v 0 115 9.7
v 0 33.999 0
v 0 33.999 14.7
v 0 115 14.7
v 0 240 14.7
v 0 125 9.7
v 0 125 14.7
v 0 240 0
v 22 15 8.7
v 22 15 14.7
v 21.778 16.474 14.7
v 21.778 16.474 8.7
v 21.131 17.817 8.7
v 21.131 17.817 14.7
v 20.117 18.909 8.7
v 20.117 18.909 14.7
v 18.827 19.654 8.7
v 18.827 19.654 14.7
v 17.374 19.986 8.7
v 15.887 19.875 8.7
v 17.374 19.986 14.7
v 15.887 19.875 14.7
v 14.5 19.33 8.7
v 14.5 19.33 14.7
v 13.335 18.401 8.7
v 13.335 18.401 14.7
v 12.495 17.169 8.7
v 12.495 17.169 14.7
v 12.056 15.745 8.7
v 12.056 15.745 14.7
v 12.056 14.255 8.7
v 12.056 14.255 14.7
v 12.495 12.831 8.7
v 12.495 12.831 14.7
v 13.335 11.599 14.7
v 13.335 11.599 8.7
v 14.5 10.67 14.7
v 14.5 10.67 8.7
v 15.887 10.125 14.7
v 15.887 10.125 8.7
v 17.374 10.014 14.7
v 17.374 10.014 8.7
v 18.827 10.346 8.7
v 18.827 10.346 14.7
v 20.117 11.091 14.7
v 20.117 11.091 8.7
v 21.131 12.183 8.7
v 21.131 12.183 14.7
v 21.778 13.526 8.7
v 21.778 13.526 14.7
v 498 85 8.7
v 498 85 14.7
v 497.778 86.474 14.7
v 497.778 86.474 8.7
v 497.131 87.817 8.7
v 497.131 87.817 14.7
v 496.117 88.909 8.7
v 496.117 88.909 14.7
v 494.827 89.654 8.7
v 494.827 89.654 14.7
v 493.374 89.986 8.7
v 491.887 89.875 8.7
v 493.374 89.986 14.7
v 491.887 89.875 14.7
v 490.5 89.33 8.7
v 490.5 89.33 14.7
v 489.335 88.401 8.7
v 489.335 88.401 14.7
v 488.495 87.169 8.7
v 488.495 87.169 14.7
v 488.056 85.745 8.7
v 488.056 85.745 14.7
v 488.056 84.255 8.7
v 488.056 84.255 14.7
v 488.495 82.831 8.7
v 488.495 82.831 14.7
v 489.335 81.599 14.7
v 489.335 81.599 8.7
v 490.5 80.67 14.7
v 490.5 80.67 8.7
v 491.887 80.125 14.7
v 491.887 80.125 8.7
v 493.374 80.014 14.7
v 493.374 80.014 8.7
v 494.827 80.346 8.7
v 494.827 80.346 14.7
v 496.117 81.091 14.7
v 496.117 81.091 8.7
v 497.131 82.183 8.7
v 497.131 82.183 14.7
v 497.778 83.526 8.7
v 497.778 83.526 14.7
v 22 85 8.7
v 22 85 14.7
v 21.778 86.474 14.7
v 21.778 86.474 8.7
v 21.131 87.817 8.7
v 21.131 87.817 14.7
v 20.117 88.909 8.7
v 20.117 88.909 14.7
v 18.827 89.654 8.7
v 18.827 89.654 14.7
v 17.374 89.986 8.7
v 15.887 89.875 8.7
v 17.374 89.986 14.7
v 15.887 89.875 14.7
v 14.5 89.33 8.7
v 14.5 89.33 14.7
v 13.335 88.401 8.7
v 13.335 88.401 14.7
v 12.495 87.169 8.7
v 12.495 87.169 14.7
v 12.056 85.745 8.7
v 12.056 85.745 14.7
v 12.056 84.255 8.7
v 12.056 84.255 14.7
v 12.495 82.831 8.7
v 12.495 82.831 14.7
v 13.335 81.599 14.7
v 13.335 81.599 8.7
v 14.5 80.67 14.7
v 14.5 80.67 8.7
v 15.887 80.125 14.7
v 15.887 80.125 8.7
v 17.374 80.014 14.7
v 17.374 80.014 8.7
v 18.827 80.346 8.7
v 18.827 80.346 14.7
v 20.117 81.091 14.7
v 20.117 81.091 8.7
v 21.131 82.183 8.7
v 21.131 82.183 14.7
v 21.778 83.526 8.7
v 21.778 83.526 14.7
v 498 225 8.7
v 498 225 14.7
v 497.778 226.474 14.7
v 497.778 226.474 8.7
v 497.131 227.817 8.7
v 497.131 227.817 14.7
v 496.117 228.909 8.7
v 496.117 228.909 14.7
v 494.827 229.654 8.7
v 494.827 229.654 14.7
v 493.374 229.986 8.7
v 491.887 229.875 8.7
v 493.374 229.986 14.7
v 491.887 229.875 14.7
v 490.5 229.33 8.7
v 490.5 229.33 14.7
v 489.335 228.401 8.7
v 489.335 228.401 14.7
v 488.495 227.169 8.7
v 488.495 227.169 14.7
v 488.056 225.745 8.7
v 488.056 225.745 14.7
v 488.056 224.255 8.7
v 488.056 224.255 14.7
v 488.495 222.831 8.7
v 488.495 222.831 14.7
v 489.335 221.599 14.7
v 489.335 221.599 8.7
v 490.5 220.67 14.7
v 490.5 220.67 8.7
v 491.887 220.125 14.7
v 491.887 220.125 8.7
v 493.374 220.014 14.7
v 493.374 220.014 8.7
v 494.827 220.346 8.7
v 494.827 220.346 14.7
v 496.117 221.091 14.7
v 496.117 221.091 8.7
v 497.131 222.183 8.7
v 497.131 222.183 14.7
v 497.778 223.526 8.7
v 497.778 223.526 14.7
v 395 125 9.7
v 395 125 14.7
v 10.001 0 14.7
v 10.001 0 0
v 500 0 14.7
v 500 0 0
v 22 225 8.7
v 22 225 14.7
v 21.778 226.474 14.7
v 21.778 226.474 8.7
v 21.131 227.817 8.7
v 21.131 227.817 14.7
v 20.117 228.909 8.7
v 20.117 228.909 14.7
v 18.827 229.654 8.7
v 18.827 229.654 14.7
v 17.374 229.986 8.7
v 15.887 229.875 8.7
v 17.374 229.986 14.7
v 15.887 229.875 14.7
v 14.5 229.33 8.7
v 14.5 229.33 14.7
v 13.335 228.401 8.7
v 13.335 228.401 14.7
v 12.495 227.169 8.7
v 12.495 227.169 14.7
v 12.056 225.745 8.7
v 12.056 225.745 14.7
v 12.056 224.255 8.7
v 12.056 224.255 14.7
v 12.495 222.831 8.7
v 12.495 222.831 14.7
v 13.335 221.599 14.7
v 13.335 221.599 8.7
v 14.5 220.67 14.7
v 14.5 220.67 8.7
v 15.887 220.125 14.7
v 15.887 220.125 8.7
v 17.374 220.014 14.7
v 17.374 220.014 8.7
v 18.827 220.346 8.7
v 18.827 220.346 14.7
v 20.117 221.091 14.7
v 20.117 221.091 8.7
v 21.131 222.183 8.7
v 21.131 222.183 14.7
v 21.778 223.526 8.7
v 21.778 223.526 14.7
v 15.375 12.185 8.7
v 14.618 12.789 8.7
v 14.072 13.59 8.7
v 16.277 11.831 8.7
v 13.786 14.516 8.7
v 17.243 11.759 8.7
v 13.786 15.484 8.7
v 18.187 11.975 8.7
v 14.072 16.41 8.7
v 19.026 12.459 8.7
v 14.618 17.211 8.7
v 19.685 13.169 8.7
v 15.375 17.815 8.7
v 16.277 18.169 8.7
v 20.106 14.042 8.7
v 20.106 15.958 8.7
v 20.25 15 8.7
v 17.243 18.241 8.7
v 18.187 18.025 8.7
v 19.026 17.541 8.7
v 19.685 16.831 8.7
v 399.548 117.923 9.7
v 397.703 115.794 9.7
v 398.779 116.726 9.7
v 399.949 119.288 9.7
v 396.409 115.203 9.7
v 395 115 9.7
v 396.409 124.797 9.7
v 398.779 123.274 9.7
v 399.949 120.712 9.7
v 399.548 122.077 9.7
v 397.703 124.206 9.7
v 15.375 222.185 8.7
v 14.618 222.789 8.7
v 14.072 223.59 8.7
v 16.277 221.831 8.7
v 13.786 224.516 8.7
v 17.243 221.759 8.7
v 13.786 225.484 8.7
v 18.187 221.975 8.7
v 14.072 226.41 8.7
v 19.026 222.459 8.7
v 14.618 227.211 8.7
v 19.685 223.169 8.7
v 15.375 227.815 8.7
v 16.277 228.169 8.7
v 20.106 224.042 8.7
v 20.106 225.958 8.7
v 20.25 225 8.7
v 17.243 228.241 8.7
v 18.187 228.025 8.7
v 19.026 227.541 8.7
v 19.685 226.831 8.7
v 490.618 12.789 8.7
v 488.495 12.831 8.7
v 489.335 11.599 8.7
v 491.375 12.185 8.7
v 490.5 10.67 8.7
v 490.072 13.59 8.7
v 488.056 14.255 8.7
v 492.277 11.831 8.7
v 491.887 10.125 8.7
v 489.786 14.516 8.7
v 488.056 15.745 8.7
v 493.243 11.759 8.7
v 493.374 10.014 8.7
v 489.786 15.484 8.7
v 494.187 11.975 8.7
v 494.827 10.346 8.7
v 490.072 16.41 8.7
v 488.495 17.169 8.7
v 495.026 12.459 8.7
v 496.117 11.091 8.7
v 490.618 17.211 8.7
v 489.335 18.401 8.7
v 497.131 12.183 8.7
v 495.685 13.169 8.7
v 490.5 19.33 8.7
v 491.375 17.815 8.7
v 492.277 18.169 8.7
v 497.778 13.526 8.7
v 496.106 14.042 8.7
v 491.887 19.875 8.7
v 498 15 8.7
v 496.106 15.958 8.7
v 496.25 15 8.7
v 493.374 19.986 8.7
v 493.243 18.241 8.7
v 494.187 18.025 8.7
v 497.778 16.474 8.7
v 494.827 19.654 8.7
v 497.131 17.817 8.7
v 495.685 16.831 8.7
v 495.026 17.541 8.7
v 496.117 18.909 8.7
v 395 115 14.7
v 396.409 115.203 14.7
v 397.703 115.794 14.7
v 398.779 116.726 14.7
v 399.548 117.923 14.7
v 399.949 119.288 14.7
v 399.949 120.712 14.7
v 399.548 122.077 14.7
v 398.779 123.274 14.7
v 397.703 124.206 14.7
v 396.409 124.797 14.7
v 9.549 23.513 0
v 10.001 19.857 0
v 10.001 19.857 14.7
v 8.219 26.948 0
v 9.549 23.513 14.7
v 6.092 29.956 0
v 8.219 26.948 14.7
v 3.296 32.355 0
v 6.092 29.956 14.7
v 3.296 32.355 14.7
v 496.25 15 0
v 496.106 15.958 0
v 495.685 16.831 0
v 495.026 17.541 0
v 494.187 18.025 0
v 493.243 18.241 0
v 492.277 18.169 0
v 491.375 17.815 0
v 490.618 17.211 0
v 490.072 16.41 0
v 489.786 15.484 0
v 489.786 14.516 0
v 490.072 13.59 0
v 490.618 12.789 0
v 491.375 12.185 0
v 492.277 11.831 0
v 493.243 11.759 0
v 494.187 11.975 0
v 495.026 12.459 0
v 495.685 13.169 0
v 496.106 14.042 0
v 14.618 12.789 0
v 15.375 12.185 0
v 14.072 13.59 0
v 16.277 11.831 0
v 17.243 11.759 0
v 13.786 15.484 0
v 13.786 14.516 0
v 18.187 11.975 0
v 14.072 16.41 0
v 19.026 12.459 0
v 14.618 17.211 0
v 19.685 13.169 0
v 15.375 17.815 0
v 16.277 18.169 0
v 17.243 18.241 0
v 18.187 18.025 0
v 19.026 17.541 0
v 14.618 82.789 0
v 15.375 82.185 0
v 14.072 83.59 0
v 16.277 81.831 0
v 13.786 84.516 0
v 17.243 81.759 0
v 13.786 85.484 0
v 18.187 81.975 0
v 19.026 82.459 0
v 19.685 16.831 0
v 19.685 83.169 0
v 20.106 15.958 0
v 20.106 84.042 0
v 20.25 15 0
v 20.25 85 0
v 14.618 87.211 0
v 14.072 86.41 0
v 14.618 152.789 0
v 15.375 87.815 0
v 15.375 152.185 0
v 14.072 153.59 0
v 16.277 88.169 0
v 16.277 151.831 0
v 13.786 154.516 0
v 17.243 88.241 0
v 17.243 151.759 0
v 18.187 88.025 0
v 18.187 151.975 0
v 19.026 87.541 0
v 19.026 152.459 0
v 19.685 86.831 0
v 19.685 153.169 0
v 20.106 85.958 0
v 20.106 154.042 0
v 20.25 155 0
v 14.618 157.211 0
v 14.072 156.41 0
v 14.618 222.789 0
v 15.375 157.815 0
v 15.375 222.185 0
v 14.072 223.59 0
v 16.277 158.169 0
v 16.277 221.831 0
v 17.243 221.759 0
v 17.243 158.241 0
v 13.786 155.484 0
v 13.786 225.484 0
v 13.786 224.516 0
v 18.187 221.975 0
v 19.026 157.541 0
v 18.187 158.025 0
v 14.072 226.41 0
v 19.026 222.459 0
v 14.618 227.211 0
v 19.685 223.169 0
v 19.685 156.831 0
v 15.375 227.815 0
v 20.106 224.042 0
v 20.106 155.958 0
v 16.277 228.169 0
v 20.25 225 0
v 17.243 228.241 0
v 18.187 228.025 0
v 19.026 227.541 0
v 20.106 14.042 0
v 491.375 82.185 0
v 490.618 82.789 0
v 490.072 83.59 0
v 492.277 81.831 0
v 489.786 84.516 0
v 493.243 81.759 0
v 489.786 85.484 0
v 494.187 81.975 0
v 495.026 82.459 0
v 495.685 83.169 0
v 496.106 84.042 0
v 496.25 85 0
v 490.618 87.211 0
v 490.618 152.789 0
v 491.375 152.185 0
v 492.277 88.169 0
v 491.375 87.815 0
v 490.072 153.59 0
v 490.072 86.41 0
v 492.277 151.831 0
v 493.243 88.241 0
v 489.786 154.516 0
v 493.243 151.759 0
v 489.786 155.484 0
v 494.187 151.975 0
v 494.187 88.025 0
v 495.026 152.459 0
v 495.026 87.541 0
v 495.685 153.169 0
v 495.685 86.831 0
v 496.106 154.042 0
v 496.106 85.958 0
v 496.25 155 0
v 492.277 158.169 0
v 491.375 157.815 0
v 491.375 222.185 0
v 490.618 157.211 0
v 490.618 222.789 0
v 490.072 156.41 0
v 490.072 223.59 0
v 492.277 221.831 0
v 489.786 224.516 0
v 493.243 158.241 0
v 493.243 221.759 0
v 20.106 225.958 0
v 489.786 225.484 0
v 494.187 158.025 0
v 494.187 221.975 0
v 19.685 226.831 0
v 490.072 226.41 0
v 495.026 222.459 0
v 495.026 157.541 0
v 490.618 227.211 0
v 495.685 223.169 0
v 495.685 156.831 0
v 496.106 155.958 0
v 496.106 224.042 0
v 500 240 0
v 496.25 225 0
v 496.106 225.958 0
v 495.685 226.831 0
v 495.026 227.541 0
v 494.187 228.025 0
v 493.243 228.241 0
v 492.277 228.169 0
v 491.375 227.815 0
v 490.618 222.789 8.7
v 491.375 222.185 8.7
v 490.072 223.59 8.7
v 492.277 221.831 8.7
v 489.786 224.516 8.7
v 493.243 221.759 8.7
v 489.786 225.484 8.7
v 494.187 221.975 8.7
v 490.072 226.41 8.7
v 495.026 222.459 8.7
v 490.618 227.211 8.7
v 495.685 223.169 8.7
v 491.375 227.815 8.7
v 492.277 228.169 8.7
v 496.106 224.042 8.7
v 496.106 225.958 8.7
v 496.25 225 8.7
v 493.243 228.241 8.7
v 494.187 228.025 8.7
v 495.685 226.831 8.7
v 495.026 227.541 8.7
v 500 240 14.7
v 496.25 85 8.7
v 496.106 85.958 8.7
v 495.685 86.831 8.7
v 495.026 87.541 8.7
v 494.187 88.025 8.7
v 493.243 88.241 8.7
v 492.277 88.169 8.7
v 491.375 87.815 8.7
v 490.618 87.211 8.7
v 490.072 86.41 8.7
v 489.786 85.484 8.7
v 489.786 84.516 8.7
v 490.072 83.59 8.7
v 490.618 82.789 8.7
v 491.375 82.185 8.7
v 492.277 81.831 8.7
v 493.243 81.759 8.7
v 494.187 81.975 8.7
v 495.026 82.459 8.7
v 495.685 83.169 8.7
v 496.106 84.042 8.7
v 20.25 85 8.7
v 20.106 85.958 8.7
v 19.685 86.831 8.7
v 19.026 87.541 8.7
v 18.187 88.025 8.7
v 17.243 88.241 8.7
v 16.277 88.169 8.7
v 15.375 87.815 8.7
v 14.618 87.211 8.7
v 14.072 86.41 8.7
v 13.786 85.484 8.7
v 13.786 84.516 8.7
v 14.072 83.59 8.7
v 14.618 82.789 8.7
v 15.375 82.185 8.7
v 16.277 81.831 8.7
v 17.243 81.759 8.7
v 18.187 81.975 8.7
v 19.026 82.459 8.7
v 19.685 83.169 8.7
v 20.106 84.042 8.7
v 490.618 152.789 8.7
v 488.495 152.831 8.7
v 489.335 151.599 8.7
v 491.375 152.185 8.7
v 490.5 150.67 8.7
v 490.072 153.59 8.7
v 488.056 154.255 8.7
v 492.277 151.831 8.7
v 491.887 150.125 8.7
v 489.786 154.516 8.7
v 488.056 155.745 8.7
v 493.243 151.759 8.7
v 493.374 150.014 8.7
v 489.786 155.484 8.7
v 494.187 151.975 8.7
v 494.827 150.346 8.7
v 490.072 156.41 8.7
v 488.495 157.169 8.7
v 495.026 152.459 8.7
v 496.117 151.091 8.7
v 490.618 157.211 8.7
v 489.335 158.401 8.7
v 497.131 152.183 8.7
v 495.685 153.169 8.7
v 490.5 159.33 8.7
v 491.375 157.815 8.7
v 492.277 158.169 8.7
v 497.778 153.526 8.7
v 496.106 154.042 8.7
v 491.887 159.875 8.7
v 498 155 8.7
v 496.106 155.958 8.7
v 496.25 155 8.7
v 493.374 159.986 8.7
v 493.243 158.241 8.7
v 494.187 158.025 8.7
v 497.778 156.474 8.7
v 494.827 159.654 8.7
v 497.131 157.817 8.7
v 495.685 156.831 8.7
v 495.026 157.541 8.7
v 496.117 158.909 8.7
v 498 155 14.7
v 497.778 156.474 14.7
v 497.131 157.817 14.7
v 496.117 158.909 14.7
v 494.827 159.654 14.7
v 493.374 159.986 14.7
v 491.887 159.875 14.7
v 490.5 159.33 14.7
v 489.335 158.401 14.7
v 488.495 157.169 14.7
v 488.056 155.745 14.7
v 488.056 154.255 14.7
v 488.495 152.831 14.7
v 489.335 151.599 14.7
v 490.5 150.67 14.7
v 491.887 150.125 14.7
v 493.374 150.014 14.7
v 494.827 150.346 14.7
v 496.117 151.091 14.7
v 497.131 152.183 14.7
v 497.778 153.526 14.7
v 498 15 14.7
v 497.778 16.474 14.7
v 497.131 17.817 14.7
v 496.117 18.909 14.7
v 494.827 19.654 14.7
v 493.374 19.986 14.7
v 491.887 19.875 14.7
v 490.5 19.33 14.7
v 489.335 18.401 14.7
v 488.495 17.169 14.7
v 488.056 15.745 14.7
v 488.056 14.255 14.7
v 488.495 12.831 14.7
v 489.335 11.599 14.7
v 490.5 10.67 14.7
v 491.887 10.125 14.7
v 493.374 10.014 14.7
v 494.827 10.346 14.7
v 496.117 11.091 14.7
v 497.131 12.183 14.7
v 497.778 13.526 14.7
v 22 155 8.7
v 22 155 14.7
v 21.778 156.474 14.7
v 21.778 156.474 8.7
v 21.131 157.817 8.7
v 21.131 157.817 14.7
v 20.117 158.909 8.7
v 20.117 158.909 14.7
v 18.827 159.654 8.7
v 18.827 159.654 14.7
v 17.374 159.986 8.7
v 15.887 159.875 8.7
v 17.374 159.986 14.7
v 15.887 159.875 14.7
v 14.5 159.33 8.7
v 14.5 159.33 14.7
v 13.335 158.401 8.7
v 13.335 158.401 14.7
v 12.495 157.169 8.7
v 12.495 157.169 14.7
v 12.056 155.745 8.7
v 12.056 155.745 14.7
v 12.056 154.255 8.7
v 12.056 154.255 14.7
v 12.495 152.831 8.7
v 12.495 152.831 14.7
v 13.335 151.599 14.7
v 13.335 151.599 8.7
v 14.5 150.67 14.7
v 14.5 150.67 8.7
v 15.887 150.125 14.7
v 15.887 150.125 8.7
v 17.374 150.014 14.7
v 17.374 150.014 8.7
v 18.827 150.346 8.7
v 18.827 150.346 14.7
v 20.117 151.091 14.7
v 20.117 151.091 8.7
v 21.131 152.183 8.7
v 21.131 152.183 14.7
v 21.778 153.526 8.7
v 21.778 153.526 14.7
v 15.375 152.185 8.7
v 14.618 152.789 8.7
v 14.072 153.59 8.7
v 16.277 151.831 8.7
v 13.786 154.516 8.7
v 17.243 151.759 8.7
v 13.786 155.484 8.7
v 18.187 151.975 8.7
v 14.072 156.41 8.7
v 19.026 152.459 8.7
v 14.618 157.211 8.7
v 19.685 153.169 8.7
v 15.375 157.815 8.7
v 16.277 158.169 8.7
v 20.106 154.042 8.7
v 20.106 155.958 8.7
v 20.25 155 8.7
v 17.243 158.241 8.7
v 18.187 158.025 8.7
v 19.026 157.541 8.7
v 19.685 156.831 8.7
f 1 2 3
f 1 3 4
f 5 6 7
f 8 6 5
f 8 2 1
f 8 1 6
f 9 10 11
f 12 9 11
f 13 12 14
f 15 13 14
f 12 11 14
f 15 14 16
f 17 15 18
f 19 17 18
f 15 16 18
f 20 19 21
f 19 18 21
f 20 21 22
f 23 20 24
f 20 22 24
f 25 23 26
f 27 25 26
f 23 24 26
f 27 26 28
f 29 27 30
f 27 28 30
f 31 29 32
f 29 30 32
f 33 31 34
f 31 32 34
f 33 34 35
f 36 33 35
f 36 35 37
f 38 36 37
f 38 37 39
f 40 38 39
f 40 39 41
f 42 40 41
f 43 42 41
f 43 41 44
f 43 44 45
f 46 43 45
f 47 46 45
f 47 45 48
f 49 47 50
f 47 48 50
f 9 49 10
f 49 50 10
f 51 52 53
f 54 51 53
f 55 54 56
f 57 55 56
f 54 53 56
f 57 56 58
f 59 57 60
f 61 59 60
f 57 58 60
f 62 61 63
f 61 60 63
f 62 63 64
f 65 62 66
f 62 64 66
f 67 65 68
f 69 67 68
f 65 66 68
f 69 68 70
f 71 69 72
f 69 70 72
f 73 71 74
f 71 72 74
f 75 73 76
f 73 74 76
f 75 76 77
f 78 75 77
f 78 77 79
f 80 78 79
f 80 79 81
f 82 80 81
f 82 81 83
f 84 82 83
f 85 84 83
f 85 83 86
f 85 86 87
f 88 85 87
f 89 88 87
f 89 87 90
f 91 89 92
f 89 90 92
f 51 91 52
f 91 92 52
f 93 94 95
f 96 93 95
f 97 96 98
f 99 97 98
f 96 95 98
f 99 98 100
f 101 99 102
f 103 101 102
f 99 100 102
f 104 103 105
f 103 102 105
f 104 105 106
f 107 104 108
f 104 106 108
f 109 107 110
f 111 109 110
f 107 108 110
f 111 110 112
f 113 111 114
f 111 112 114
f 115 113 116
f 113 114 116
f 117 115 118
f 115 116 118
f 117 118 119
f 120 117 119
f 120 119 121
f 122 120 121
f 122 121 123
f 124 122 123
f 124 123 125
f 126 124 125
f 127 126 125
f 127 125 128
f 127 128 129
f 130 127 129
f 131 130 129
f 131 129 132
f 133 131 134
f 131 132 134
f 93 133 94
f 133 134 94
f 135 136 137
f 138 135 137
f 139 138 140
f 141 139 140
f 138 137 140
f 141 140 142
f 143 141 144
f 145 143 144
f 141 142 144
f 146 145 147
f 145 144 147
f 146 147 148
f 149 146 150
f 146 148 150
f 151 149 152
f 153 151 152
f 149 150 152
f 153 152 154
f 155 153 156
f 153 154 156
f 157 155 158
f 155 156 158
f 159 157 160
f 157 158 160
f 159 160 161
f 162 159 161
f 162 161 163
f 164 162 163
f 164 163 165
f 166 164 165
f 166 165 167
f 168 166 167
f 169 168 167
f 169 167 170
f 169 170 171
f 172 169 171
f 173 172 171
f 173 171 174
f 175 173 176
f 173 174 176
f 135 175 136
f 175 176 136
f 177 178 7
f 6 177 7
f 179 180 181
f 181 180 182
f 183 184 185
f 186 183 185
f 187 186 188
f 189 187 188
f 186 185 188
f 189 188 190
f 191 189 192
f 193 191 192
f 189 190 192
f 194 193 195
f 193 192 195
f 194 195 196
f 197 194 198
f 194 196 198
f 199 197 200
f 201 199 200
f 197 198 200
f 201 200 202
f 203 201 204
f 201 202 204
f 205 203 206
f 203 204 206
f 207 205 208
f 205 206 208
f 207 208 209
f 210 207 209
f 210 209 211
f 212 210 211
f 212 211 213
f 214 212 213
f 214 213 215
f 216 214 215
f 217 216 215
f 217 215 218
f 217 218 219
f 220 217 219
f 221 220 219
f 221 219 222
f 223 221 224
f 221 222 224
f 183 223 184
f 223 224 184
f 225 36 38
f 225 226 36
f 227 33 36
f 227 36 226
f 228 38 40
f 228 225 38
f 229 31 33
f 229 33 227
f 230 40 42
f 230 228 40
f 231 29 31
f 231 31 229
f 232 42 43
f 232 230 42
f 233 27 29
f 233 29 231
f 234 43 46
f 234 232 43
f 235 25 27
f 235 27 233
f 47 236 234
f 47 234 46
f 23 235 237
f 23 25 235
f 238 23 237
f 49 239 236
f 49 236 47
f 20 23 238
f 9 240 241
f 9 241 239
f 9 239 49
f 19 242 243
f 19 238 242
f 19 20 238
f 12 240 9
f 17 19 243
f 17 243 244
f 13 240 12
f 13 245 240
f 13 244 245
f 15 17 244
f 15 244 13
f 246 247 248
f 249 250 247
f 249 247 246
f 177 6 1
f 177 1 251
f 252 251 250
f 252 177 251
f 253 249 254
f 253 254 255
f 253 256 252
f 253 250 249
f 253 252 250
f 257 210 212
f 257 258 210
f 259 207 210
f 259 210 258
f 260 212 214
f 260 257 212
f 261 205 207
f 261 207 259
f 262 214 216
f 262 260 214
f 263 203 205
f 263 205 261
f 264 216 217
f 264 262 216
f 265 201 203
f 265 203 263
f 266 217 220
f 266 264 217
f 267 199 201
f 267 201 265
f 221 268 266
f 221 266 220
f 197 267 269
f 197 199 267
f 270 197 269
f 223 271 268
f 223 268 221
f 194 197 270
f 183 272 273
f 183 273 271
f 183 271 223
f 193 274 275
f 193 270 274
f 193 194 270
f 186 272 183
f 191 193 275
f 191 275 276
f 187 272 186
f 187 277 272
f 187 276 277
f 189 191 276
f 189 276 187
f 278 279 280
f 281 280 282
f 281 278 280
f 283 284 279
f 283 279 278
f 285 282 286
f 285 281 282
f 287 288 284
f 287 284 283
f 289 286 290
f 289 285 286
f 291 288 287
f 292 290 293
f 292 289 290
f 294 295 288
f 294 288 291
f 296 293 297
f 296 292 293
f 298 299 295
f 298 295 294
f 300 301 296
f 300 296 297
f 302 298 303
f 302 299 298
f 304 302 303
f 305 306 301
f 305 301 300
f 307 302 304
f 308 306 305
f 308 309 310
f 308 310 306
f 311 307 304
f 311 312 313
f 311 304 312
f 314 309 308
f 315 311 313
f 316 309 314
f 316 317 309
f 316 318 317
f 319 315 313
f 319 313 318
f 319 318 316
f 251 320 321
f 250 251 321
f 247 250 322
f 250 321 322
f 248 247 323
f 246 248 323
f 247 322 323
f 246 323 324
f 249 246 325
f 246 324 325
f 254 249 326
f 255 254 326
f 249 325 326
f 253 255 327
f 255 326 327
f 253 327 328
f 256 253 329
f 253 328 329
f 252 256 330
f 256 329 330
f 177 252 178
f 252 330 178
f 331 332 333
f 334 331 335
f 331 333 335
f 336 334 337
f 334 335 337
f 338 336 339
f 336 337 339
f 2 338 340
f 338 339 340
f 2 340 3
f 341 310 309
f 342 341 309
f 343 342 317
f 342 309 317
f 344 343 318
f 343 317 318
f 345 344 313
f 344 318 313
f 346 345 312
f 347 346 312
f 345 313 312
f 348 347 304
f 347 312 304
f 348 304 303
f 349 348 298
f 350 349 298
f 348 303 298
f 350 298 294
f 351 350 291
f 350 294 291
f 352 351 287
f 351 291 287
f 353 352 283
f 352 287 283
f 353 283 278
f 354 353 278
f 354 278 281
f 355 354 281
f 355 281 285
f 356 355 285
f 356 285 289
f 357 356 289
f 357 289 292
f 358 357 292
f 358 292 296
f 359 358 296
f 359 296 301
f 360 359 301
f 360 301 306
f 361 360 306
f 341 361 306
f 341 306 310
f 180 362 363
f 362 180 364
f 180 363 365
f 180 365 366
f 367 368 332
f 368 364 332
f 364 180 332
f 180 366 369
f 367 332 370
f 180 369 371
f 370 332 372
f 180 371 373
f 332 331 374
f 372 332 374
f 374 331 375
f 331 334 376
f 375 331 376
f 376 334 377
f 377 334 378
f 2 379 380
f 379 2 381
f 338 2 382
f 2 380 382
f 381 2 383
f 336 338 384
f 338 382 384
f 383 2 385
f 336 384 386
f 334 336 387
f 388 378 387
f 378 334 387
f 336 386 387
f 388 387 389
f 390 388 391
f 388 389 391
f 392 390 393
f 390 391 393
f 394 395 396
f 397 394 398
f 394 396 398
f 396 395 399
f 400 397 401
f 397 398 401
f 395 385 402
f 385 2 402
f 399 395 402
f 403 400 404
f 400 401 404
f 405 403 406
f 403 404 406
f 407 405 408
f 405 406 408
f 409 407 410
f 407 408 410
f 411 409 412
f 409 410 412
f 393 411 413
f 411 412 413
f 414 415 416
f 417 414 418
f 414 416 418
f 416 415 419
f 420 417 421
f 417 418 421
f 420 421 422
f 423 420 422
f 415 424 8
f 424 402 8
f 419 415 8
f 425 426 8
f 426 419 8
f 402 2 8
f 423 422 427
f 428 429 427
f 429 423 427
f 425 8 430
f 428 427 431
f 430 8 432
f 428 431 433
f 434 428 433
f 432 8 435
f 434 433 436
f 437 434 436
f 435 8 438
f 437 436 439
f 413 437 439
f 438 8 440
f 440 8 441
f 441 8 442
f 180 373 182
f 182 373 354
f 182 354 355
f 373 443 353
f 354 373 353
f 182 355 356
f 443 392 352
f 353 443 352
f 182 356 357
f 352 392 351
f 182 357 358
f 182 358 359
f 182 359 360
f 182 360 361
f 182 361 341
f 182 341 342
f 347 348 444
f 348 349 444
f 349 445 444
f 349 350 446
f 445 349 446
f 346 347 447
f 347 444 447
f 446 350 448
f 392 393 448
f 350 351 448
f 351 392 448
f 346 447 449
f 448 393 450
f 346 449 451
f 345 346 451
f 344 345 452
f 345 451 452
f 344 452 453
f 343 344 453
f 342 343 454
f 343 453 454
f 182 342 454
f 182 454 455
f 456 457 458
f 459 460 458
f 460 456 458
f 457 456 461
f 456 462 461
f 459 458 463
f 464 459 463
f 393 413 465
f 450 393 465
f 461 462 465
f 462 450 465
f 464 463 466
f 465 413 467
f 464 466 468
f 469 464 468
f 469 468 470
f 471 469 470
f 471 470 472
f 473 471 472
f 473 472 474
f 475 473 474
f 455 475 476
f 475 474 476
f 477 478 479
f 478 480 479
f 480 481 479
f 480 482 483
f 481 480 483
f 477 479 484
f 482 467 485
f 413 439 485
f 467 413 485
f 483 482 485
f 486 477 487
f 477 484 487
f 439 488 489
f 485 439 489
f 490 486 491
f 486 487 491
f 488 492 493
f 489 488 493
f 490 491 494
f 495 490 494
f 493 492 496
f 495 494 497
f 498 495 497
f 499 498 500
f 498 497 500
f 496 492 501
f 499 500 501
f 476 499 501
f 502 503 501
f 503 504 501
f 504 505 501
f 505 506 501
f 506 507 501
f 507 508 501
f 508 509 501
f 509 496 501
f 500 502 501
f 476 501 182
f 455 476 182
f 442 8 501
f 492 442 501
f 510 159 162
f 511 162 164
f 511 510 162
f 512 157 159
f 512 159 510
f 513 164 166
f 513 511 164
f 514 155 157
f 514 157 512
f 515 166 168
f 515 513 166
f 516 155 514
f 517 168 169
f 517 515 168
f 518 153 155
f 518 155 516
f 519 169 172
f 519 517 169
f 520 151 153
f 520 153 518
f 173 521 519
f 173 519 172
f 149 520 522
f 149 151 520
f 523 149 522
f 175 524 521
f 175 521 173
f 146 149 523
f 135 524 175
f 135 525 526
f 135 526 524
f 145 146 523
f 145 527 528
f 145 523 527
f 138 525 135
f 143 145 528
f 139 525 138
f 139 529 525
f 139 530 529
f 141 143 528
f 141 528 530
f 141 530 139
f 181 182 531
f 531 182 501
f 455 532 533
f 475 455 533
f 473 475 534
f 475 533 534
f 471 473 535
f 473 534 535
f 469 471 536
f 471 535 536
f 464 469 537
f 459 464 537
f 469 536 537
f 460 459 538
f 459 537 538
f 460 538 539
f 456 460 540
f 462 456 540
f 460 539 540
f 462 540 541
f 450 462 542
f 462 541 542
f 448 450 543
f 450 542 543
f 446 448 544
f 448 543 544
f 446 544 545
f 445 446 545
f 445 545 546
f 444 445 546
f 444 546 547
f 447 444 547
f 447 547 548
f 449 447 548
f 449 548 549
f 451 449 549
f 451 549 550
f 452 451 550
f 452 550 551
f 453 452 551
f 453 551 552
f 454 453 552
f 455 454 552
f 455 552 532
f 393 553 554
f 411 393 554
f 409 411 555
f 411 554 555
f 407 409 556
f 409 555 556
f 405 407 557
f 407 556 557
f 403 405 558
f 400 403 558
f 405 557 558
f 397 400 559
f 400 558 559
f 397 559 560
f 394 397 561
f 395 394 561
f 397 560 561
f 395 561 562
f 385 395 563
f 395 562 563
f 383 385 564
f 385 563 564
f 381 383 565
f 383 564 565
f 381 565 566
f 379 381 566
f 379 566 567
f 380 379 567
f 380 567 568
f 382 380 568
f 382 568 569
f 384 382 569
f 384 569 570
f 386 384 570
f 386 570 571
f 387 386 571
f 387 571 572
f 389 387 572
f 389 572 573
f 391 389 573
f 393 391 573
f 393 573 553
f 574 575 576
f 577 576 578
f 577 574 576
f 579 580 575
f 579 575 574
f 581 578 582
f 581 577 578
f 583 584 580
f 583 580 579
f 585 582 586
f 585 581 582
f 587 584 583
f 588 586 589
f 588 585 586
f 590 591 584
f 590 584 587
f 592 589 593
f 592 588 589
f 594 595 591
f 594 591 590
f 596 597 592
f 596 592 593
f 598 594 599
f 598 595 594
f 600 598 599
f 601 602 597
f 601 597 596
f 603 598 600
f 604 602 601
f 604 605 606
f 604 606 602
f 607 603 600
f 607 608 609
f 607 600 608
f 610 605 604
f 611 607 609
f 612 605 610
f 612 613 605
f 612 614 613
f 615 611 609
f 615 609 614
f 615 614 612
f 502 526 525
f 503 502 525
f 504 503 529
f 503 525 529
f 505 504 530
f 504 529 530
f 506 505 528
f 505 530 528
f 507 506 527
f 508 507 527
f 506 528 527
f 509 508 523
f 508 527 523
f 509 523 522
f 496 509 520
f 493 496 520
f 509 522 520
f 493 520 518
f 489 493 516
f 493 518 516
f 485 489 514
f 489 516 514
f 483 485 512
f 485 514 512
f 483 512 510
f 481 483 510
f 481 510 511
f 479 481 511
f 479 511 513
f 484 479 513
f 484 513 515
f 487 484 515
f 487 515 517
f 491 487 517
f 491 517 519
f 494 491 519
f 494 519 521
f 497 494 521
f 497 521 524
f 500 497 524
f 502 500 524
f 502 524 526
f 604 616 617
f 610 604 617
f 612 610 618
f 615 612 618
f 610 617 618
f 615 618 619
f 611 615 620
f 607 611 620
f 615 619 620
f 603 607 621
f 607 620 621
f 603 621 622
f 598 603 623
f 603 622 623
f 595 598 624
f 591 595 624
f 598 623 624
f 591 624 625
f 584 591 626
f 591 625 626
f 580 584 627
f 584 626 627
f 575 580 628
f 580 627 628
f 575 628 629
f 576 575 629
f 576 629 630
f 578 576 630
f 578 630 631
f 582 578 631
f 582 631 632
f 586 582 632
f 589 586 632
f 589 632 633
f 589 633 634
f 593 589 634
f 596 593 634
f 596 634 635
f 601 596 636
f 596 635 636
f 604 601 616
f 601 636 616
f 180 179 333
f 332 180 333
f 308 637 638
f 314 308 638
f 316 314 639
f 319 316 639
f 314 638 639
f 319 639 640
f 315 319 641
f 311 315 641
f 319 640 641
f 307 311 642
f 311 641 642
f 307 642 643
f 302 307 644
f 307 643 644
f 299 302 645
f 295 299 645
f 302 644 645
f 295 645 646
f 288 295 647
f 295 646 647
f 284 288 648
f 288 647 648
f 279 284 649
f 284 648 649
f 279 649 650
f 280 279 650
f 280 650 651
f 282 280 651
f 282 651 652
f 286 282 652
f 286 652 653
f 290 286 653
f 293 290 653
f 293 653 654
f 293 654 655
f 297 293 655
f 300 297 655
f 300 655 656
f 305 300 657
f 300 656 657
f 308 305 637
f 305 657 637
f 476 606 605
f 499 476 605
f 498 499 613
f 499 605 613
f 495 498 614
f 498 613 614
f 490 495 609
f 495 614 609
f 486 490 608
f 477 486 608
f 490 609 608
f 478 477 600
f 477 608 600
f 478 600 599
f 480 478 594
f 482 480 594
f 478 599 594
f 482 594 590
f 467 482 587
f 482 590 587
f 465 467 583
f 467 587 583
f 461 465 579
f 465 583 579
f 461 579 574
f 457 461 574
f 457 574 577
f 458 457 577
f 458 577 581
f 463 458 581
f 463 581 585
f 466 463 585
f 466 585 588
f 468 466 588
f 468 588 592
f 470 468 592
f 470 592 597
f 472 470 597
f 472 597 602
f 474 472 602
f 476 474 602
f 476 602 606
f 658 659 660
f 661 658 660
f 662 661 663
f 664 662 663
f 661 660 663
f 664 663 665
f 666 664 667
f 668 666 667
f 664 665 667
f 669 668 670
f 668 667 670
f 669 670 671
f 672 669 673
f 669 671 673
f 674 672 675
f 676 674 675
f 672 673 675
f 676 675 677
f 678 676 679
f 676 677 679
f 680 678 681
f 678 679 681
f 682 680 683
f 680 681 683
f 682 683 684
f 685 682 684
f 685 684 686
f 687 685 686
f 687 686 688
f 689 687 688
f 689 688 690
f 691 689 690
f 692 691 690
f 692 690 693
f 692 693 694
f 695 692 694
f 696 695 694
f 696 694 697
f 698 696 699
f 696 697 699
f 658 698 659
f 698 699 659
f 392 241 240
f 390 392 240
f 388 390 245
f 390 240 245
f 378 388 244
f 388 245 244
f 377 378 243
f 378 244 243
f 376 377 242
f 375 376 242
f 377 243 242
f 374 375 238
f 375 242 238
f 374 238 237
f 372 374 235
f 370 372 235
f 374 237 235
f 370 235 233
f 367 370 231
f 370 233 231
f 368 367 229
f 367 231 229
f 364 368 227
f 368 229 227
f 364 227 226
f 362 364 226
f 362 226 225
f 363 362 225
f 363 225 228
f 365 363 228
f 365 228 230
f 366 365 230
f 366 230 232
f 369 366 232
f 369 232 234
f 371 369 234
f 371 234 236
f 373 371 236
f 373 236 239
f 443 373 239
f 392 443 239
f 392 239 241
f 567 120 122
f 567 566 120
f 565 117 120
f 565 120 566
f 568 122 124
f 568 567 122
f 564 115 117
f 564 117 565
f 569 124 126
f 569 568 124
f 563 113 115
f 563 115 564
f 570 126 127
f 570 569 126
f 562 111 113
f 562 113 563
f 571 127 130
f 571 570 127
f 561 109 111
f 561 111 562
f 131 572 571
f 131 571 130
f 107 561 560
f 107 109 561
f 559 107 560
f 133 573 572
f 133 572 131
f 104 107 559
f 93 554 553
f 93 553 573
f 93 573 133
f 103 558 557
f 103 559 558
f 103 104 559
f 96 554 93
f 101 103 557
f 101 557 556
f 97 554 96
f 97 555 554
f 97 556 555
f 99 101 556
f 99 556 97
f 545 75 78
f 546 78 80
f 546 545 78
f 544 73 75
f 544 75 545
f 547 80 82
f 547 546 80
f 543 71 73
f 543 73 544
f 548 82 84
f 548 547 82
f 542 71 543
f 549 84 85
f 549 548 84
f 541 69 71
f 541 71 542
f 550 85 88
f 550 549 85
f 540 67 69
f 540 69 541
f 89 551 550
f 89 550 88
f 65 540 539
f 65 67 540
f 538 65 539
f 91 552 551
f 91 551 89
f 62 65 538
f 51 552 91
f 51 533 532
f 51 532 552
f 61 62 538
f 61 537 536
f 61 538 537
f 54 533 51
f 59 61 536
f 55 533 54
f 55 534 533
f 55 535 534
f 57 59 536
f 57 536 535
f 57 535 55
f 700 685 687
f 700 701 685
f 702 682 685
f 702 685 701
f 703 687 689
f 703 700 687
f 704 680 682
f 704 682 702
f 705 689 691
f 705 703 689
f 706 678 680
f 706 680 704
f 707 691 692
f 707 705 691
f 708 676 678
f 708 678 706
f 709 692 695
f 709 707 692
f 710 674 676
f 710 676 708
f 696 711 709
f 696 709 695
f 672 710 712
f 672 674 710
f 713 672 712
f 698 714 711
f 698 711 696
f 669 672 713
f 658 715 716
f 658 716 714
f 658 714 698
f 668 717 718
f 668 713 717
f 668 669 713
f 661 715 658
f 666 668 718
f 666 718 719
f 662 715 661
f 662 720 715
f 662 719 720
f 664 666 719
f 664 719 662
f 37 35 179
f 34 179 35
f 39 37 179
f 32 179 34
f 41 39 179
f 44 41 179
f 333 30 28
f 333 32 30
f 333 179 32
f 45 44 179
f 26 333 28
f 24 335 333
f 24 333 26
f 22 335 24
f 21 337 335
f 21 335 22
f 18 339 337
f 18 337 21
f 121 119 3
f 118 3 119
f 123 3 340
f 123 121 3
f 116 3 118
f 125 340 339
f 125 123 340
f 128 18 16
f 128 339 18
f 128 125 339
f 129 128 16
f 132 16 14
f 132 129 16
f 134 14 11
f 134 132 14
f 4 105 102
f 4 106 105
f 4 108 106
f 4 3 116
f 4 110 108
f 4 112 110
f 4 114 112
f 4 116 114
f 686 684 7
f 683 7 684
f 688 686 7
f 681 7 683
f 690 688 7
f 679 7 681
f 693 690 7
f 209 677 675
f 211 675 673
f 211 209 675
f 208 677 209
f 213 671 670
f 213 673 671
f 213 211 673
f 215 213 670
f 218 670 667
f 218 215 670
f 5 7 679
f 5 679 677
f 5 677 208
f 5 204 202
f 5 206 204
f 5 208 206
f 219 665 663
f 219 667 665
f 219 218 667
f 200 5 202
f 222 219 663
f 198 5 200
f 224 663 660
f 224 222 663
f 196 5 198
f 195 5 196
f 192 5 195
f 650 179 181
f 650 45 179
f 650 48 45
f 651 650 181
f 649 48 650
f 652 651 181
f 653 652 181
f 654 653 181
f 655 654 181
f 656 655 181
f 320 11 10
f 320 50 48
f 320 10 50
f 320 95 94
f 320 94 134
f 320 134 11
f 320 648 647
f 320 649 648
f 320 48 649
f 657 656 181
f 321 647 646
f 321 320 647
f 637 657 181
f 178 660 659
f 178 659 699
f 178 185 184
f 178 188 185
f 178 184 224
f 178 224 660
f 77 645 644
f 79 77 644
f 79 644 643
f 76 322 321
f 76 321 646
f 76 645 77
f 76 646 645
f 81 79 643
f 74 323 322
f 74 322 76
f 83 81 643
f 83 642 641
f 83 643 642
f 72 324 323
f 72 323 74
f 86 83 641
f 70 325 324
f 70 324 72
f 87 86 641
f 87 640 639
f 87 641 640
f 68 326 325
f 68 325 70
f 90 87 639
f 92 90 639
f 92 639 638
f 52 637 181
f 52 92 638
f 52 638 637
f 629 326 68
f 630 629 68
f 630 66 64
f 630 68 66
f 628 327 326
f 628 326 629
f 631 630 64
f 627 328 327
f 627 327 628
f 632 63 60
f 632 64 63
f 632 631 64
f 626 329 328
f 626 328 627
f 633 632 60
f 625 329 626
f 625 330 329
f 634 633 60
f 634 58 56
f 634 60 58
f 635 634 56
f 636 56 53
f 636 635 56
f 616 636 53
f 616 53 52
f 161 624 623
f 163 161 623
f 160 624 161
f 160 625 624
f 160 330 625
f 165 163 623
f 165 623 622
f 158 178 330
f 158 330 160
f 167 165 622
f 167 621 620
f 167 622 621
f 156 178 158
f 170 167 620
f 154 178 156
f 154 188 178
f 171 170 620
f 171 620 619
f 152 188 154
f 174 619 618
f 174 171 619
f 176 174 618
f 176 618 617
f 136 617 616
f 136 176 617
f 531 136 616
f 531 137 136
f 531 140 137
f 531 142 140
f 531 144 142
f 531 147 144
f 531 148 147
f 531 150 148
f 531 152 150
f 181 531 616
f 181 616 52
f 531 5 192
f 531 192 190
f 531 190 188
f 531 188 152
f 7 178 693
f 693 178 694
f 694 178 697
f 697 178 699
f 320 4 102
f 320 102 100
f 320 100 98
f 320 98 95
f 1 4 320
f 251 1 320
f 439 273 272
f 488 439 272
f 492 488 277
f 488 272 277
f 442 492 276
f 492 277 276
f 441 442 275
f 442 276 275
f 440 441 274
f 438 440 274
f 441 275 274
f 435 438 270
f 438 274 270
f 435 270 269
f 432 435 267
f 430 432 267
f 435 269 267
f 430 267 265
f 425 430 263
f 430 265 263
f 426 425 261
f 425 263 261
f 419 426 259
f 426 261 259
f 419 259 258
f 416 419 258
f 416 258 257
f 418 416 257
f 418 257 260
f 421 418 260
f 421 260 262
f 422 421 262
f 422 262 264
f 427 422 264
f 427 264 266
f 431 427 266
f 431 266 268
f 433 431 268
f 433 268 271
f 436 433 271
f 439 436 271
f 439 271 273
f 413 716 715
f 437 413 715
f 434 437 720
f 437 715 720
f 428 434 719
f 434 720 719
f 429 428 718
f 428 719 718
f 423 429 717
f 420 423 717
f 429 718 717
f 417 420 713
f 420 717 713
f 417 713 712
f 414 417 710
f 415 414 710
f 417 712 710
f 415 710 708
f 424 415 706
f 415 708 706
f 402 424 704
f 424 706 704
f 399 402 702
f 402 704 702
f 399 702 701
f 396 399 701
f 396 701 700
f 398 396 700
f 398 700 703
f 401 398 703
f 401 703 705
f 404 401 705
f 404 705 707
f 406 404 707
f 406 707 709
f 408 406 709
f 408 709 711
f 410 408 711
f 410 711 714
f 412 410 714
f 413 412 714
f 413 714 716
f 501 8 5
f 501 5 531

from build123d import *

# Parameters (mm, degrees)
BOX_W              = 500
BOX_H              = 240
BOX_DEPTH          = 14.7
POCKET_DEPTH       = 14.701
SKETCH001_R        = 5
POCKET001_DEPTH    = 6
SKETCH001001_R     = 3.25
POCKET002_DEPTH    = 14.701
POCKET003001_DEPTH = 5


with BuildPart() as part:
    # Box → Box (new body)
    with BuildSketch(Plane.XY):
        with Locations((250, 120)):
            Rectangle(BOX_W, BOX_H)
    extrude(amount=BOX_DEPTH)

    # Sketch → Pocket (cut, through all)
    with BuildSketch(Plane.XY.offset(14.7)):
        with BuildLine():
            Line((10.001, 0), (10.001, 19.857041))
            ThreePointArc((10.001, 19.857041), (5.607587, 30.463616), (-4.999, 34.857))
            Line((-4.999, 0), (-4.999, 34.857))
            Line((10.001, 0), (-4.999, 0))
        make_face()
    extrude(amount=-POCKET_DEPTH, mode=Mode.SUBTRACT)

    # Sketch001 → Pocket001 (cut)
    with BuildSketch(Plane.XY.offset(14.7)):
        with Locations((17, 225)):
            Circle(SKETCH001_R)
        with Locations((17, 85)):
            Circle(SKETCH001_R)
        with Locations((17, 15)):
            Circle(SKETCH001_R)
        with Locations((17, 155)):
            Circle(SKETCH001_R)
        with Locations((493, 155)):
            Circle(SKETCH001_R)
        with Locations((493, 85)):
            Circle(SKETCH001_R)
        with Locations((493, 225)):
            Circle(SKETCH001_R)
        with Locations((493, 15)):
            Circle(SKETCH001_R)
    extrude(amount=-POCKET001_DEPTH, mode=Mode.SUBTRACT)

    # Sketch001001 → Pocket002 (cut, through all)
    with BuildSketch(Plane.XY.offset(14.7)):
        with Locations((17, 225)):
            Circle(SKETCH001001_R)
        with Locations((17, 85)):
            Circle(SKETCH001001_R)
        with Locations((17, 15)):
            Circle(SKETCH001001_R)
        with Locations((17, 155)):
            Circle(SKETCH001001_R)
        with Locations((493, 155)):
            Circle(SKETCH001001_R)
        with Locations((493, 85)):
            Circle(SKETCH001001_R)
        with Locations((493, 225)):
            Circle(SKETCH001001_R)
        with Locations((493, 15)):
            Circle(SKETCH001001_R)
    extrude(amount=-POCKET002_DEPTH, mode=Mode.SUBTRACT)

    # Sketch001002 → Pocket003001 (cut)
    with BuildSketch(Plane.XY.offset(14.7)):
        with BuildLine():
            Line((395, 125), (0, 125))
            Line((0, 125), (0, 115))
            Line((0, 115), (395, 115))
            ThreePointArc((395, 115), (400.000017, 120), (395, 125))
        make_face()
    extrude(amount=-POCKET003001_DEPTH, mode=Mode.SUBTRACT)


solid = part.part
